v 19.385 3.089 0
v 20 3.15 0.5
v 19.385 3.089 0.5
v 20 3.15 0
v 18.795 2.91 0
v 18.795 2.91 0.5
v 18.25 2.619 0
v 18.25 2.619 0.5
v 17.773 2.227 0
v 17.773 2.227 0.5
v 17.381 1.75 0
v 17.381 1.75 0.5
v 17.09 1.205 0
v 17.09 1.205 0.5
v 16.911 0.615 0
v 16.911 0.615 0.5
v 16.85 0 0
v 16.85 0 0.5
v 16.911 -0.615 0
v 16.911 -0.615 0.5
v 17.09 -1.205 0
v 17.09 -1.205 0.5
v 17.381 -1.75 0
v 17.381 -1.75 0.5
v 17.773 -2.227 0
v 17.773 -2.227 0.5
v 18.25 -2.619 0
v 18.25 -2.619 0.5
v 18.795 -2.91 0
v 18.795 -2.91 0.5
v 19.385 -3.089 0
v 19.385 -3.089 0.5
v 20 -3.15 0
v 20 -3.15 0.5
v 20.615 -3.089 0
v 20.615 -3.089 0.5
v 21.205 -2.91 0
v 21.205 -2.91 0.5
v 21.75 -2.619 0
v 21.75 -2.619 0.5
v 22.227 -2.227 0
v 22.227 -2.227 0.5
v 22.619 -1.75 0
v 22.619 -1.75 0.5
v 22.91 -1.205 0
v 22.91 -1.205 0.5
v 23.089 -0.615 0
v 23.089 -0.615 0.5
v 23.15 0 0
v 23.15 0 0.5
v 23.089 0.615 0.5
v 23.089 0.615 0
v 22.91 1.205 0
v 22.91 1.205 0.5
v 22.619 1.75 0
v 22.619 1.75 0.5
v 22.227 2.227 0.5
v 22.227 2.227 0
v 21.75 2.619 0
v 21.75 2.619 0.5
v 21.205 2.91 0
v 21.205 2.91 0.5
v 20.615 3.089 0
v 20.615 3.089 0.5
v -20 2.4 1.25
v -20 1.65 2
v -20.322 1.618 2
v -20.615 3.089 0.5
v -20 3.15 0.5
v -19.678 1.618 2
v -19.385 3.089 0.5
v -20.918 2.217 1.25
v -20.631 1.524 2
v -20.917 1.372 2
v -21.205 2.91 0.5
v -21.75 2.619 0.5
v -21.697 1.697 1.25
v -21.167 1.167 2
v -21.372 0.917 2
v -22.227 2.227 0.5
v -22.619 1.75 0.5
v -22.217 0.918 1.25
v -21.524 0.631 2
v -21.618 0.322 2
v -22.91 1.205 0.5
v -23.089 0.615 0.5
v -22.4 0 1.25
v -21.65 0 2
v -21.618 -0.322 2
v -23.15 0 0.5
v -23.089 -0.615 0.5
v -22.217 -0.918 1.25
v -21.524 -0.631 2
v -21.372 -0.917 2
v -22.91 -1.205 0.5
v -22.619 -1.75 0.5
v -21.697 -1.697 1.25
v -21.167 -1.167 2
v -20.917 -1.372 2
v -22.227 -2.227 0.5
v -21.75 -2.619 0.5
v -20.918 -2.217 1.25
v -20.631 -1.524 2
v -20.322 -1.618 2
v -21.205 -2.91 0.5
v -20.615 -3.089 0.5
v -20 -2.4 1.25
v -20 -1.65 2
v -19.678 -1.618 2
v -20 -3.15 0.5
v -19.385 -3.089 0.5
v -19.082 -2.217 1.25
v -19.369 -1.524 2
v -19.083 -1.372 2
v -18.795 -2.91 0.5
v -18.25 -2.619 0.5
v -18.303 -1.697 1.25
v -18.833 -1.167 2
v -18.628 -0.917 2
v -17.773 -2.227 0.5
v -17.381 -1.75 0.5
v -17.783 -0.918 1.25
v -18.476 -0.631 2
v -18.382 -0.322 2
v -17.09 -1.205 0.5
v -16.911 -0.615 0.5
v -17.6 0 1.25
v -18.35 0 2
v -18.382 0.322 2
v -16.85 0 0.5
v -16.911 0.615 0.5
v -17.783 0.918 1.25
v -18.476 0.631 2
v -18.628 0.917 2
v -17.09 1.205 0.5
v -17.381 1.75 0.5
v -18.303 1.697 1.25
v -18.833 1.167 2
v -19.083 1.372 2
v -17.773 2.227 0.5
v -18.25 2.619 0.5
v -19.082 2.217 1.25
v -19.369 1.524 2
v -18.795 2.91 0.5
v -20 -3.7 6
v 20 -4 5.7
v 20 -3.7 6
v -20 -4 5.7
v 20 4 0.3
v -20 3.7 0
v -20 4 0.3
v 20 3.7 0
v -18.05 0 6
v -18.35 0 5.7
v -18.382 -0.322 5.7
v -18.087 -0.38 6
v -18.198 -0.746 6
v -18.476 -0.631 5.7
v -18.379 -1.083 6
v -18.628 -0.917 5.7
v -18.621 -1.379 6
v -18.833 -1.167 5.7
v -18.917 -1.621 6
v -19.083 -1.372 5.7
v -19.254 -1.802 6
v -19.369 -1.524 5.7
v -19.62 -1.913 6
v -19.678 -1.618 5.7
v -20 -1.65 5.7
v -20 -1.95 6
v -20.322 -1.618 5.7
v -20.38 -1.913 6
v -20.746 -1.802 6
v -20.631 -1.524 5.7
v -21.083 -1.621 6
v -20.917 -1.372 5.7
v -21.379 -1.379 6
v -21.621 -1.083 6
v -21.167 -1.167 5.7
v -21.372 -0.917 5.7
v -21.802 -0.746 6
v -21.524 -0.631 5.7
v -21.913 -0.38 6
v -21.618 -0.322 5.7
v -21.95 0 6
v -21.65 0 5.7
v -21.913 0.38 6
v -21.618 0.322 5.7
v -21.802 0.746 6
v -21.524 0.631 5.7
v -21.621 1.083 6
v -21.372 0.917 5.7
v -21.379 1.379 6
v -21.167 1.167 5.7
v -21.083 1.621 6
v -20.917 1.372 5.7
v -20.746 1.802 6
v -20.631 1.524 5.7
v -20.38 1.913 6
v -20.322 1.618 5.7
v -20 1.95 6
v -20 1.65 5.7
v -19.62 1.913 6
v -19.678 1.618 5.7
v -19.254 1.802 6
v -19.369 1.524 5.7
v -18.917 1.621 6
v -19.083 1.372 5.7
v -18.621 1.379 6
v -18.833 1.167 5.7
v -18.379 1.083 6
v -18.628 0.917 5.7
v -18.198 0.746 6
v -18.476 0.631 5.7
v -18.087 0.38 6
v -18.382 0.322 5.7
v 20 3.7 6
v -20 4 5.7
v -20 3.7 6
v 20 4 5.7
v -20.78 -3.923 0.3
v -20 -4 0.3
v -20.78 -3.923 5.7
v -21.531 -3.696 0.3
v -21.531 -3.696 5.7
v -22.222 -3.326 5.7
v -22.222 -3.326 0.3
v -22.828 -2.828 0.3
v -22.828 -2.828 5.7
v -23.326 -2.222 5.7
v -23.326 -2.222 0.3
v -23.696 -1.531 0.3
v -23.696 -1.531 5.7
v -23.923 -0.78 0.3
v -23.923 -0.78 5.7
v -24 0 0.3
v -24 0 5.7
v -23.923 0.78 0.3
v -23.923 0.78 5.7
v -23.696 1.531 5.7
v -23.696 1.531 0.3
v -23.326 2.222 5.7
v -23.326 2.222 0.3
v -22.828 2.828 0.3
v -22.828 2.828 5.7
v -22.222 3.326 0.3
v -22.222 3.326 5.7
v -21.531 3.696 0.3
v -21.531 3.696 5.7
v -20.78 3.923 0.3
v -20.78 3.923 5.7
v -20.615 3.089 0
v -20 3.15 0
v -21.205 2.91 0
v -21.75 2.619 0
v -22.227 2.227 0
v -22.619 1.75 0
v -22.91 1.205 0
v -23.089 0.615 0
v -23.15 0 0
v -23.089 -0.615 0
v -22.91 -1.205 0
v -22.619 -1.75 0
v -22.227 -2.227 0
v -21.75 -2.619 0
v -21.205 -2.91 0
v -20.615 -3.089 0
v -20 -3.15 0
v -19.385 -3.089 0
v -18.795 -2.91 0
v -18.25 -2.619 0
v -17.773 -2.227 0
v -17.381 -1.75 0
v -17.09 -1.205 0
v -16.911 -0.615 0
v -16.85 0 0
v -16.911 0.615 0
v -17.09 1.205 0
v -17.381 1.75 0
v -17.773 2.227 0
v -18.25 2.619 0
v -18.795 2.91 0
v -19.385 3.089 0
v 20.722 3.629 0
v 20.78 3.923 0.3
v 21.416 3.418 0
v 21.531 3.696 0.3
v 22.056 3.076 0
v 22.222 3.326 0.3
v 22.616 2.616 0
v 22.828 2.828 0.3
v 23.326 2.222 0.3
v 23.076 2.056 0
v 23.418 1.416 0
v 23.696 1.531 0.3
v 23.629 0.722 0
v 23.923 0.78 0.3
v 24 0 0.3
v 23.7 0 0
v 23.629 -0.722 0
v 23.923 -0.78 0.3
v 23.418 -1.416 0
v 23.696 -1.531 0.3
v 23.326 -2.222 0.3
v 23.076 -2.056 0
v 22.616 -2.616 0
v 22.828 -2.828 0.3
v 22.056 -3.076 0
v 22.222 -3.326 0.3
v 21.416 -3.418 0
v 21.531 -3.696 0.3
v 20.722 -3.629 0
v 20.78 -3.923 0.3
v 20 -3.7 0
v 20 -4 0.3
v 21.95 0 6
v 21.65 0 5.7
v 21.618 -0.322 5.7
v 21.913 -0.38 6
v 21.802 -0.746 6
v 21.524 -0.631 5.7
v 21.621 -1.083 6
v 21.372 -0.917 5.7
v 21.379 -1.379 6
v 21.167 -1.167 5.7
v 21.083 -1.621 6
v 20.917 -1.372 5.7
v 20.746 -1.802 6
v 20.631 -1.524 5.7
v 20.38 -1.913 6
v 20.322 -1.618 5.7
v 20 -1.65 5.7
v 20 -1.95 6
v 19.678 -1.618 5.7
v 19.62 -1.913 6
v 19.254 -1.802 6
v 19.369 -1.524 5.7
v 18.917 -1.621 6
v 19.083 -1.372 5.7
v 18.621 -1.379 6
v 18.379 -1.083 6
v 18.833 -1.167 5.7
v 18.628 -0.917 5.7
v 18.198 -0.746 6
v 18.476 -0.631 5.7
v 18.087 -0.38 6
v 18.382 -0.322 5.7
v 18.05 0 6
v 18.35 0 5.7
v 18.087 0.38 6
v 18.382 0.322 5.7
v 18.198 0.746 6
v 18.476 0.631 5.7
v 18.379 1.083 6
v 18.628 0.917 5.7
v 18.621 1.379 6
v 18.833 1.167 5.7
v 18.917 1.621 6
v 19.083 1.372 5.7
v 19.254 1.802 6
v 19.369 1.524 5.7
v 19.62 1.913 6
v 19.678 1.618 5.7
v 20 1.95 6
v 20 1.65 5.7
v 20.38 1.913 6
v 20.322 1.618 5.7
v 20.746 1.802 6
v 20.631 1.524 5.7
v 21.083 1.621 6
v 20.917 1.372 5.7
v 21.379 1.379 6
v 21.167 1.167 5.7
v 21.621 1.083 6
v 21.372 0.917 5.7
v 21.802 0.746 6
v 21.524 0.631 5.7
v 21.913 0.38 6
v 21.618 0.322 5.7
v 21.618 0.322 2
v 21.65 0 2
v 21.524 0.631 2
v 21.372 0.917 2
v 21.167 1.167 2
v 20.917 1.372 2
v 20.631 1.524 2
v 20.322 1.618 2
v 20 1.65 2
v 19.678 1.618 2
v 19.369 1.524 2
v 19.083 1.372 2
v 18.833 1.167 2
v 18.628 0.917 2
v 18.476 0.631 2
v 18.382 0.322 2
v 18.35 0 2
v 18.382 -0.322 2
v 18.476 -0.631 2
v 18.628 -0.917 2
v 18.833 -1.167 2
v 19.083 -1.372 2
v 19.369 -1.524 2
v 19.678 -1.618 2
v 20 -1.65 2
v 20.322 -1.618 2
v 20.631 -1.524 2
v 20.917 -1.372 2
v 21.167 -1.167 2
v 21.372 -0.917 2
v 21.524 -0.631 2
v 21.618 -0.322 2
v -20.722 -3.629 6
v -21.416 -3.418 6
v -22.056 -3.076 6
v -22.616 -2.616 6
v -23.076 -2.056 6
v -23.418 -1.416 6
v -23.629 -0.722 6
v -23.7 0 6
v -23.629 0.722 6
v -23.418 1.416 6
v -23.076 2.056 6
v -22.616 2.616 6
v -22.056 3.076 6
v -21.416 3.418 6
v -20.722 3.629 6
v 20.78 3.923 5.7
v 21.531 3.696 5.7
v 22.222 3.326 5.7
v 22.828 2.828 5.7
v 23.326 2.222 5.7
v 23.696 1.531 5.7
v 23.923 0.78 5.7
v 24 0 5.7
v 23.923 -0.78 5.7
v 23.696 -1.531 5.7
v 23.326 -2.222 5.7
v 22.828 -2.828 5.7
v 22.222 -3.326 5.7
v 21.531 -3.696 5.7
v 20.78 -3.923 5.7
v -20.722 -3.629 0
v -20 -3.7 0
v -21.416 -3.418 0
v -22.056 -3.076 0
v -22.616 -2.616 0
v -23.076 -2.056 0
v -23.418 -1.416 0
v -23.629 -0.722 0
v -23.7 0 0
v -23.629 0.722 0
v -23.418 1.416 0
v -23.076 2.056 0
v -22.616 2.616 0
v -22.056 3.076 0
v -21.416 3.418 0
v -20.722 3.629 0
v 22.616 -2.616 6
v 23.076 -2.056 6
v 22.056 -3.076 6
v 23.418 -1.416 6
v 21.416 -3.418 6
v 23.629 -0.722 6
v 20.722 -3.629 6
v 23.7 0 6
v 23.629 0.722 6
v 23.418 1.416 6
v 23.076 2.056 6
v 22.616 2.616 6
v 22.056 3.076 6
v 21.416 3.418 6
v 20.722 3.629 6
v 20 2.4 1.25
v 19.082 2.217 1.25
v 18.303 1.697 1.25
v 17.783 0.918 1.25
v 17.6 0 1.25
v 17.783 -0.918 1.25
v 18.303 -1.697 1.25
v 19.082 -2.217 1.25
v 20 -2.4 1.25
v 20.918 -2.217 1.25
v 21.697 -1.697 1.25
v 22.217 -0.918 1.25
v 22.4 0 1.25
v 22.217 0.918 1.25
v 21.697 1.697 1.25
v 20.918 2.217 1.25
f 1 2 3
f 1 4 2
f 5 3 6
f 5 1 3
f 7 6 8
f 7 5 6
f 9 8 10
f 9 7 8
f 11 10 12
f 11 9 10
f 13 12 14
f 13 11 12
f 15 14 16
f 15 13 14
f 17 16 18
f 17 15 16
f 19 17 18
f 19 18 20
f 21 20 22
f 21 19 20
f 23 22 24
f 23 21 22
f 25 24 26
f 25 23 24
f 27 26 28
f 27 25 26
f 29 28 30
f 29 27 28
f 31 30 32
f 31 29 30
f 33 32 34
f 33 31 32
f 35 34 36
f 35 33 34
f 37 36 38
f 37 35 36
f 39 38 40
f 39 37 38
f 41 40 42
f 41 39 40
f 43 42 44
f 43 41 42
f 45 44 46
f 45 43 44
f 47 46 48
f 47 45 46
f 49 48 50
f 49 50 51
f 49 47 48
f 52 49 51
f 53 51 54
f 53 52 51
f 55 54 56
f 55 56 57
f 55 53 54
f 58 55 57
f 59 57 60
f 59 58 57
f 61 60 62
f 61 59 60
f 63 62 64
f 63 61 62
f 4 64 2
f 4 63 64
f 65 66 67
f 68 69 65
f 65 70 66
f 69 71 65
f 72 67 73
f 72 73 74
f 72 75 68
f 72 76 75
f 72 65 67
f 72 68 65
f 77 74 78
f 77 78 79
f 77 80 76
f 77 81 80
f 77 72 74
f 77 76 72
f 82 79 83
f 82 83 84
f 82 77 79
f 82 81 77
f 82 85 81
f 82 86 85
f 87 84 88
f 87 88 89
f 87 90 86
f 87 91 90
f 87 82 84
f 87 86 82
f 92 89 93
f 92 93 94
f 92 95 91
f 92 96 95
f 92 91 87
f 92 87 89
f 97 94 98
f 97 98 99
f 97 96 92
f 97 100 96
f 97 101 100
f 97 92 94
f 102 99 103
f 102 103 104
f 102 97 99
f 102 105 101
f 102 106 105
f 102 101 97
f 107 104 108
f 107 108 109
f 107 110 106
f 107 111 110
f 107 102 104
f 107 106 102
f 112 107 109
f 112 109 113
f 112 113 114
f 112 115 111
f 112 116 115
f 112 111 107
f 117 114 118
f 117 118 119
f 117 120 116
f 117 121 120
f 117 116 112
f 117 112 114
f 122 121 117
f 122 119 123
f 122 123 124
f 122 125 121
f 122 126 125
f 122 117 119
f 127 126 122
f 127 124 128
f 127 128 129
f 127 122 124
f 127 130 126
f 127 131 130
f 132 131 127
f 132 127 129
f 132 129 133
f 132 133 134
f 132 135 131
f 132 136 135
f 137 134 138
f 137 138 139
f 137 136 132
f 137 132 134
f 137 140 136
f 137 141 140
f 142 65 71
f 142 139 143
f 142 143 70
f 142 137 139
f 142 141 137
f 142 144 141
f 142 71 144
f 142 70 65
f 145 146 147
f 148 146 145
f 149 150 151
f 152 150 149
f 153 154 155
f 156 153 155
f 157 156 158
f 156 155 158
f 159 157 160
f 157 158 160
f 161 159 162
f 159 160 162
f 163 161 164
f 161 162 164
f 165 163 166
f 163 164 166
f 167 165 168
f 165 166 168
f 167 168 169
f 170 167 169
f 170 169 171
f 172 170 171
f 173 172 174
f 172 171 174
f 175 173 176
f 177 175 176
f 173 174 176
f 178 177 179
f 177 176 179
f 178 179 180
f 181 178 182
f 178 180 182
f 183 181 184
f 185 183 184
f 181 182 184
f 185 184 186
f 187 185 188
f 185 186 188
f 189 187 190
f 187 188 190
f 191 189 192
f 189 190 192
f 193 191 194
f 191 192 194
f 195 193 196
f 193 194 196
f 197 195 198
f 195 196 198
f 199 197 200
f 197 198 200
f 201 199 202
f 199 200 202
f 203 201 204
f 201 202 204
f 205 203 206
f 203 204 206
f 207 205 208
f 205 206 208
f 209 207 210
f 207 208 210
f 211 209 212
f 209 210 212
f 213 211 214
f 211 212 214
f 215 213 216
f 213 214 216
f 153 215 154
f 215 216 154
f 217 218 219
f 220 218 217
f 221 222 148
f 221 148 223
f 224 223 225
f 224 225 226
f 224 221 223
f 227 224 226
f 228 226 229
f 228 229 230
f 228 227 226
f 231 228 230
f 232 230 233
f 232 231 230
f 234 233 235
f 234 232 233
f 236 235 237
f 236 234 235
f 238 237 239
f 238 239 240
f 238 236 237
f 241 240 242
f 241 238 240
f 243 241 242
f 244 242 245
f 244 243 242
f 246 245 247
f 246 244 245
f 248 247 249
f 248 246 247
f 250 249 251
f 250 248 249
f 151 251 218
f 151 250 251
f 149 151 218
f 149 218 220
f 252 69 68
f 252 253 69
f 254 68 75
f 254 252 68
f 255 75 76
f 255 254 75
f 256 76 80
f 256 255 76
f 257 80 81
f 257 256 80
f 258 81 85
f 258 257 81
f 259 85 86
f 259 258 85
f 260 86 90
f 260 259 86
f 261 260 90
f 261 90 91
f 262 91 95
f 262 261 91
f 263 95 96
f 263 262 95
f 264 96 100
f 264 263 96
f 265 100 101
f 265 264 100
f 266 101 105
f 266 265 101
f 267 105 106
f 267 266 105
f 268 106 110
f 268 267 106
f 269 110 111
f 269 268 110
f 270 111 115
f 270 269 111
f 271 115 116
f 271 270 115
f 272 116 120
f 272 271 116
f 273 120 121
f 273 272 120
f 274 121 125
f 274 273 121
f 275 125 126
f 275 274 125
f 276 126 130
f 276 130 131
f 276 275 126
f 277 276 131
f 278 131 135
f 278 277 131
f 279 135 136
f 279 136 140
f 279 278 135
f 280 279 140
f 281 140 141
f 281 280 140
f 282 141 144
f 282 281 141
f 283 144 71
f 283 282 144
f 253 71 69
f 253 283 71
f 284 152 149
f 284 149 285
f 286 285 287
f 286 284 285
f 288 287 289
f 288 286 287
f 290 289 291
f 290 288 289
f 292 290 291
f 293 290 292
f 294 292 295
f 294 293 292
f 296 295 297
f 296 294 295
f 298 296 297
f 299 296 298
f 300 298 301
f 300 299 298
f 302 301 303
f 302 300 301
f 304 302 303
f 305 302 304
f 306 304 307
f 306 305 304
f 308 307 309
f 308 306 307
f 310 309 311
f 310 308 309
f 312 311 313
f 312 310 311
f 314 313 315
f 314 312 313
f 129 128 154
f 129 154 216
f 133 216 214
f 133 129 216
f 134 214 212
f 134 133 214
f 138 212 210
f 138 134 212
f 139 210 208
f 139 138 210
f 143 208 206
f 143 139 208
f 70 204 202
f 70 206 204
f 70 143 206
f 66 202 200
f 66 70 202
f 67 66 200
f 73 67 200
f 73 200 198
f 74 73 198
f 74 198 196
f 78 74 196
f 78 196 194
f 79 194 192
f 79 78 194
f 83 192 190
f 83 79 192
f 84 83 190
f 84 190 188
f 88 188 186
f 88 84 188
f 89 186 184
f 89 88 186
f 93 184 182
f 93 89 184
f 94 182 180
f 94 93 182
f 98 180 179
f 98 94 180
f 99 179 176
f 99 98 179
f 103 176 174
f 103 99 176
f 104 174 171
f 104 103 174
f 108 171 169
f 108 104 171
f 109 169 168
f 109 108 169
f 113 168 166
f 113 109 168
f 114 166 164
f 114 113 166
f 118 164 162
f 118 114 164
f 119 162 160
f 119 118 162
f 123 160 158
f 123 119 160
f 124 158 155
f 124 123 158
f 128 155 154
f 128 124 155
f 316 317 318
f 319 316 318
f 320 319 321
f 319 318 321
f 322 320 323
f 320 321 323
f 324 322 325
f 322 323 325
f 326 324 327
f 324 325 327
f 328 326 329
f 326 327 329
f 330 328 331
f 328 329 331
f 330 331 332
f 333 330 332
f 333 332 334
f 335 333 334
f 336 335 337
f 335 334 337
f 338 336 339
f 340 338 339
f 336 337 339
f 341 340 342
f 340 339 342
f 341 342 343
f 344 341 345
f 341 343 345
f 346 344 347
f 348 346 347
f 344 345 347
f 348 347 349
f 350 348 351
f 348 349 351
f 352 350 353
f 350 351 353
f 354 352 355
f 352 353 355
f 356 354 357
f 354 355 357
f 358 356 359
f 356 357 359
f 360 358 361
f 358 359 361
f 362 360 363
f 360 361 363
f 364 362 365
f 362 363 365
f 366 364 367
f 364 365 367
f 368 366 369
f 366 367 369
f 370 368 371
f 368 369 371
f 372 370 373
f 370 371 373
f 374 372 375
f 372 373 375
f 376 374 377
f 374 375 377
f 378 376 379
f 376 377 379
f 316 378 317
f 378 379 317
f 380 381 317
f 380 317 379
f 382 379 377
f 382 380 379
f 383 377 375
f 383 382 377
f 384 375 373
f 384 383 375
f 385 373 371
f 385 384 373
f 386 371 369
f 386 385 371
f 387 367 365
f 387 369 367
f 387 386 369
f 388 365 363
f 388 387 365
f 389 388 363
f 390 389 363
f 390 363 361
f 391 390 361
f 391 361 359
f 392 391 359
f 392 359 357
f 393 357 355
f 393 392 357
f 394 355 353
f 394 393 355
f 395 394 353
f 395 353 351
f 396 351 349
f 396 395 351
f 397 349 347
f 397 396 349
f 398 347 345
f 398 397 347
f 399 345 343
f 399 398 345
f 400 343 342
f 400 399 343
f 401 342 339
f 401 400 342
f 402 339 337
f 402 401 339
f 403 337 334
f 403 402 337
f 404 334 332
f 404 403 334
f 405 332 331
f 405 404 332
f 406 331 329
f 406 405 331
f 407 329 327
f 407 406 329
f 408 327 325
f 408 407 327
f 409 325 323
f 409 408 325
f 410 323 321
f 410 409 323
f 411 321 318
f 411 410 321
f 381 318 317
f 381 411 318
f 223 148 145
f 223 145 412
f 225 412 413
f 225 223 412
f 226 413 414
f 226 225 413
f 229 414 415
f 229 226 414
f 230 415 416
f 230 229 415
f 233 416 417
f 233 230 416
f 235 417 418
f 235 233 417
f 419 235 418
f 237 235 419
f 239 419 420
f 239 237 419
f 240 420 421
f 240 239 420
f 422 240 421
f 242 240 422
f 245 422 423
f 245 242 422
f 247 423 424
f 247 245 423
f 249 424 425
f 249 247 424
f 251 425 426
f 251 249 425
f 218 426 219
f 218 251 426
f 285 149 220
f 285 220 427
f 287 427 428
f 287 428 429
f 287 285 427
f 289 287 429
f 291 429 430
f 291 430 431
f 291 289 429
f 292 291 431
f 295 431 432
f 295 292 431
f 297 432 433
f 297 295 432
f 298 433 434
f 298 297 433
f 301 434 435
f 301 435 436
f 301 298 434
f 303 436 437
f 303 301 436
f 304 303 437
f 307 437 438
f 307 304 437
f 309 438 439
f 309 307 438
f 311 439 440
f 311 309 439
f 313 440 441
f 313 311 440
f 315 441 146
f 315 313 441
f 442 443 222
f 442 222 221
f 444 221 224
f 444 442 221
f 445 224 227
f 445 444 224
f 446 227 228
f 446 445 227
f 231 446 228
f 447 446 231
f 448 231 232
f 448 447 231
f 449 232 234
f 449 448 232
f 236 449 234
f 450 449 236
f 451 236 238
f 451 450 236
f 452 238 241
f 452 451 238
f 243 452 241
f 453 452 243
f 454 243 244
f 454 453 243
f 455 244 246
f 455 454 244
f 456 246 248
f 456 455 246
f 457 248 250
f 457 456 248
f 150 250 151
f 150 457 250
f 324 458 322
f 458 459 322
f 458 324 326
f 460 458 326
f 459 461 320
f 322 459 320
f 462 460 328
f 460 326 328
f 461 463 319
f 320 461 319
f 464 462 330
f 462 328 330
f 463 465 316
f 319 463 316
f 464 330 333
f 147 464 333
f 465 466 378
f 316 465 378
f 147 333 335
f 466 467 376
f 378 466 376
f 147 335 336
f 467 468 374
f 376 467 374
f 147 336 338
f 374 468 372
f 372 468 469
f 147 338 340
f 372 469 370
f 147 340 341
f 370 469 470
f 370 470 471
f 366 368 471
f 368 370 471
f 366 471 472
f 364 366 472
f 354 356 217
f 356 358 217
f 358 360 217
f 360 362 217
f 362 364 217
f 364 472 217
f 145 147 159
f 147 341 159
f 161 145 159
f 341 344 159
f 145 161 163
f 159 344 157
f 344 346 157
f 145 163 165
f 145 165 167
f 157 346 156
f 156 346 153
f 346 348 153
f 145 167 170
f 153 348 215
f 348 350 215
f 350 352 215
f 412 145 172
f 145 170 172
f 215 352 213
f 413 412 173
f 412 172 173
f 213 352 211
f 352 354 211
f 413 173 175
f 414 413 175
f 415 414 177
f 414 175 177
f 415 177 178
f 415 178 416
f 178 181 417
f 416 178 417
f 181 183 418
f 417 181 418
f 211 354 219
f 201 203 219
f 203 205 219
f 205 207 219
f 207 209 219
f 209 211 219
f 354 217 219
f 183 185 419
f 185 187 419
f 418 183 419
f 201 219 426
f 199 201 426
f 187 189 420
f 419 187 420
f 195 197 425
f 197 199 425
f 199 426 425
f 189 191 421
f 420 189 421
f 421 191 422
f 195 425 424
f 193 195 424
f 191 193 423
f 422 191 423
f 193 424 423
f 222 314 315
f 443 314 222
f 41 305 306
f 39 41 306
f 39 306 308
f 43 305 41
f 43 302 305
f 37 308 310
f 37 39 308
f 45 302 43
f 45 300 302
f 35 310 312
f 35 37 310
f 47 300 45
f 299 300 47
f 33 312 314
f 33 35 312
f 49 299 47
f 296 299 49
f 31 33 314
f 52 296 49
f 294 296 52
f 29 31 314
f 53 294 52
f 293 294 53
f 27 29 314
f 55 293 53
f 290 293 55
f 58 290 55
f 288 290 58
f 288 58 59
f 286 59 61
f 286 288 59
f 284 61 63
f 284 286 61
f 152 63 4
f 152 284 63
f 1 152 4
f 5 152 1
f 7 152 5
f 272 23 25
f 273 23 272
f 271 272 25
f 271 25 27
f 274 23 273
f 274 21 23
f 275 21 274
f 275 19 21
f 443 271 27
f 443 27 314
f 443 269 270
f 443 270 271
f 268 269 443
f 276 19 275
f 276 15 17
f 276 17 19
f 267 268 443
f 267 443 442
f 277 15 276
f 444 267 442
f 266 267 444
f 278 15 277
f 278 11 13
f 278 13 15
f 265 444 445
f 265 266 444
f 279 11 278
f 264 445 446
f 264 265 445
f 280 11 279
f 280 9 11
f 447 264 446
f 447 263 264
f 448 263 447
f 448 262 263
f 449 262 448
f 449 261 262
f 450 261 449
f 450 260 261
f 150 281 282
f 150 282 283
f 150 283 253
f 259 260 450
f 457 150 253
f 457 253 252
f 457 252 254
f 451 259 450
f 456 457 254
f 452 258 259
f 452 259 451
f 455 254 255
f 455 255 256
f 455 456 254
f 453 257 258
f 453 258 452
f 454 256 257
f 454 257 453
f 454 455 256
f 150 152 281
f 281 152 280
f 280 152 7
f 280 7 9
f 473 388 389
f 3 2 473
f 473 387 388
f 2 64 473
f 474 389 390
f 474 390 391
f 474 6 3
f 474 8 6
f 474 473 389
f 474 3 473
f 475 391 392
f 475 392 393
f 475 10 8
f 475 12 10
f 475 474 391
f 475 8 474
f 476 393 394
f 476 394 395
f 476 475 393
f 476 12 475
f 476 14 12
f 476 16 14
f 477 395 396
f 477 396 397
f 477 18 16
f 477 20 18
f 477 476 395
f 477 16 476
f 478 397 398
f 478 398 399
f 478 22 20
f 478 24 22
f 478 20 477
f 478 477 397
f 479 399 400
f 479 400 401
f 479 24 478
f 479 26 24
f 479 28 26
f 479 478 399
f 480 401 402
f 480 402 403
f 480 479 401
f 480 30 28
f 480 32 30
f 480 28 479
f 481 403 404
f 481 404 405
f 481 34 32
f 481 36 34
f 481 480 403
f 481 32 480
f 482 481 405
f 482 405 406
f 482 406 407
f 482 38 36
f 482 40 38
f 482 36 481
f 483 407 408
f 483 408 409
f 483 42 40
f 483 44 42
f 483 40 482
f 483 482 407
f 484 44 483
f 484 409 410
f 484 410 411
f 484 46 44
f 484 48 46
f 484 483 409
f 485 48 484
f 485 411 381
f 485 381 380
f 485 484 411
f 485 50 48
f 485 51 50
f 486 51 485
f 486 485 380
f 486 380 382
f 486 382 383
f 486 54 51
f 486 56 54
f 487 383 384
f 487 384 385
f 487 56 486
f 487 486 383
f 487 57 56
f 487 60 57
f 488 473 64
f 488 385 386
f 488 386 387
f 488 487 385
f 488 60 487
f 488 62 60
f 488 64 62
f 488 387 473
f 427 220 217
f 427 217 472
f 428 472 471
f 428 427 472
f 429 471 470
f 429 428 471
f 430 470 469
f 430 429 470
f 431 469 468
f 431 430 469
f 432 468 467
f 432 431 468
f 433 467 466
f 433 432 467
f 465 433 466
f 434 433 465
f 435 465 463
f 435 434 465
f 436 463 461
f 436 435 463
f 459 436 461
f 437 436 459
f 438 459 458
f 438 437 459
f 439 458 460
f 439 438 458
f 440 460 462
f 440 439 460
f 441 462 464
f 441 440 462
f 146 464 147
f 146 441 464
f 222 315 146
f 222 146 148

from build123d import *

# Parameters (mm, degrees)
SKETCH1_R                                    = 1.65
BOSS_EXTRUDE1_DEPTH                          = 6
CSK_FOR_M3_COUNTERSUNK_FLAT_HEAD_SCR_2_COUNT = 2
CSK_FOR_M3_COUNTERSUNK_FLAT_HEAD_SCR_2_PITCH = 40
CHAMFER1_SIZE                                = 0.3


with BuildPart() as part:
    # Sketch1 → Boss-Extrude1 (new body)
    with BuildSketch(Plane.XY):
        with BuildLine():
            Line((-20, 4), (20, 4))
            ThreePointArc((20, 4), (24, 0), (20, -4))
            Line((20, -4), (-20, -4))
            ThreePointArc((-20, -4), (-24, 0), (-20, 4))
        make_face()
        with Locations((-20, 0)):
            Circle(SKETCH1_R, mode=Mode.SUBTRACT)
        with Locations((20, 0)):
            Circle(SKETCH1_R, mode=Mode.SUBTRACT)
    extrude(amount=BOSS_EXTRUDE1_DEPTH)

    # Sketch3 → CSK for M3 Countersunk Flat Head Screw1 (revolve, cut)
    with BuildSketch(Plane.YZ.offset(-20)):
        Polygon((0, 0), (0, 6), (1.65, 6), (1.65, 2), (3.15, 0.5), (3.15, 0), align=None)
    csk_for_m3_countersunk_flat_head_screw1 = revolve(axis=Axis((-20, 0, -6.35), (0, 0, 1)), mode=Mode.SUBTRACT)

    # CSK for M3 Countersunk Flat Head Scr 2: CSK for M3 Countersunk Flat Head Screw1 ×2
    with Locations(*[(i * CSK_FOR_M3_COUNTERSUNK_FLAT_HEAD_SCR_2_PITCH, 0, 0) for i in range(1, CSK_FOR_M3_COUNTERSUNK_FLAT_HEAD_SCR_2_COUNT)]):
        add(csk_for_m3_countersunk_flat_head_screw1, mode=Mode.SUBTRACT)

    # Chamfer1
    chamfer1_edges = [part.edges().sort_by_distance(p)[0] for p in [
        (-21.65, 0, 6),
        (24, 0, 6),
        (18.35, 0, 6),
        (0, 4, 6),
        (-24, 0, 6),
        (0, 4, 0),
        (24, 0, 0),
        (0, -4, 0),
        (-24, 0, 0),
        (0, -4, 6),
    ]]
    chamfer(chamfer1_edges, length=CHAMFER1_SIZE)


solid = part.part
